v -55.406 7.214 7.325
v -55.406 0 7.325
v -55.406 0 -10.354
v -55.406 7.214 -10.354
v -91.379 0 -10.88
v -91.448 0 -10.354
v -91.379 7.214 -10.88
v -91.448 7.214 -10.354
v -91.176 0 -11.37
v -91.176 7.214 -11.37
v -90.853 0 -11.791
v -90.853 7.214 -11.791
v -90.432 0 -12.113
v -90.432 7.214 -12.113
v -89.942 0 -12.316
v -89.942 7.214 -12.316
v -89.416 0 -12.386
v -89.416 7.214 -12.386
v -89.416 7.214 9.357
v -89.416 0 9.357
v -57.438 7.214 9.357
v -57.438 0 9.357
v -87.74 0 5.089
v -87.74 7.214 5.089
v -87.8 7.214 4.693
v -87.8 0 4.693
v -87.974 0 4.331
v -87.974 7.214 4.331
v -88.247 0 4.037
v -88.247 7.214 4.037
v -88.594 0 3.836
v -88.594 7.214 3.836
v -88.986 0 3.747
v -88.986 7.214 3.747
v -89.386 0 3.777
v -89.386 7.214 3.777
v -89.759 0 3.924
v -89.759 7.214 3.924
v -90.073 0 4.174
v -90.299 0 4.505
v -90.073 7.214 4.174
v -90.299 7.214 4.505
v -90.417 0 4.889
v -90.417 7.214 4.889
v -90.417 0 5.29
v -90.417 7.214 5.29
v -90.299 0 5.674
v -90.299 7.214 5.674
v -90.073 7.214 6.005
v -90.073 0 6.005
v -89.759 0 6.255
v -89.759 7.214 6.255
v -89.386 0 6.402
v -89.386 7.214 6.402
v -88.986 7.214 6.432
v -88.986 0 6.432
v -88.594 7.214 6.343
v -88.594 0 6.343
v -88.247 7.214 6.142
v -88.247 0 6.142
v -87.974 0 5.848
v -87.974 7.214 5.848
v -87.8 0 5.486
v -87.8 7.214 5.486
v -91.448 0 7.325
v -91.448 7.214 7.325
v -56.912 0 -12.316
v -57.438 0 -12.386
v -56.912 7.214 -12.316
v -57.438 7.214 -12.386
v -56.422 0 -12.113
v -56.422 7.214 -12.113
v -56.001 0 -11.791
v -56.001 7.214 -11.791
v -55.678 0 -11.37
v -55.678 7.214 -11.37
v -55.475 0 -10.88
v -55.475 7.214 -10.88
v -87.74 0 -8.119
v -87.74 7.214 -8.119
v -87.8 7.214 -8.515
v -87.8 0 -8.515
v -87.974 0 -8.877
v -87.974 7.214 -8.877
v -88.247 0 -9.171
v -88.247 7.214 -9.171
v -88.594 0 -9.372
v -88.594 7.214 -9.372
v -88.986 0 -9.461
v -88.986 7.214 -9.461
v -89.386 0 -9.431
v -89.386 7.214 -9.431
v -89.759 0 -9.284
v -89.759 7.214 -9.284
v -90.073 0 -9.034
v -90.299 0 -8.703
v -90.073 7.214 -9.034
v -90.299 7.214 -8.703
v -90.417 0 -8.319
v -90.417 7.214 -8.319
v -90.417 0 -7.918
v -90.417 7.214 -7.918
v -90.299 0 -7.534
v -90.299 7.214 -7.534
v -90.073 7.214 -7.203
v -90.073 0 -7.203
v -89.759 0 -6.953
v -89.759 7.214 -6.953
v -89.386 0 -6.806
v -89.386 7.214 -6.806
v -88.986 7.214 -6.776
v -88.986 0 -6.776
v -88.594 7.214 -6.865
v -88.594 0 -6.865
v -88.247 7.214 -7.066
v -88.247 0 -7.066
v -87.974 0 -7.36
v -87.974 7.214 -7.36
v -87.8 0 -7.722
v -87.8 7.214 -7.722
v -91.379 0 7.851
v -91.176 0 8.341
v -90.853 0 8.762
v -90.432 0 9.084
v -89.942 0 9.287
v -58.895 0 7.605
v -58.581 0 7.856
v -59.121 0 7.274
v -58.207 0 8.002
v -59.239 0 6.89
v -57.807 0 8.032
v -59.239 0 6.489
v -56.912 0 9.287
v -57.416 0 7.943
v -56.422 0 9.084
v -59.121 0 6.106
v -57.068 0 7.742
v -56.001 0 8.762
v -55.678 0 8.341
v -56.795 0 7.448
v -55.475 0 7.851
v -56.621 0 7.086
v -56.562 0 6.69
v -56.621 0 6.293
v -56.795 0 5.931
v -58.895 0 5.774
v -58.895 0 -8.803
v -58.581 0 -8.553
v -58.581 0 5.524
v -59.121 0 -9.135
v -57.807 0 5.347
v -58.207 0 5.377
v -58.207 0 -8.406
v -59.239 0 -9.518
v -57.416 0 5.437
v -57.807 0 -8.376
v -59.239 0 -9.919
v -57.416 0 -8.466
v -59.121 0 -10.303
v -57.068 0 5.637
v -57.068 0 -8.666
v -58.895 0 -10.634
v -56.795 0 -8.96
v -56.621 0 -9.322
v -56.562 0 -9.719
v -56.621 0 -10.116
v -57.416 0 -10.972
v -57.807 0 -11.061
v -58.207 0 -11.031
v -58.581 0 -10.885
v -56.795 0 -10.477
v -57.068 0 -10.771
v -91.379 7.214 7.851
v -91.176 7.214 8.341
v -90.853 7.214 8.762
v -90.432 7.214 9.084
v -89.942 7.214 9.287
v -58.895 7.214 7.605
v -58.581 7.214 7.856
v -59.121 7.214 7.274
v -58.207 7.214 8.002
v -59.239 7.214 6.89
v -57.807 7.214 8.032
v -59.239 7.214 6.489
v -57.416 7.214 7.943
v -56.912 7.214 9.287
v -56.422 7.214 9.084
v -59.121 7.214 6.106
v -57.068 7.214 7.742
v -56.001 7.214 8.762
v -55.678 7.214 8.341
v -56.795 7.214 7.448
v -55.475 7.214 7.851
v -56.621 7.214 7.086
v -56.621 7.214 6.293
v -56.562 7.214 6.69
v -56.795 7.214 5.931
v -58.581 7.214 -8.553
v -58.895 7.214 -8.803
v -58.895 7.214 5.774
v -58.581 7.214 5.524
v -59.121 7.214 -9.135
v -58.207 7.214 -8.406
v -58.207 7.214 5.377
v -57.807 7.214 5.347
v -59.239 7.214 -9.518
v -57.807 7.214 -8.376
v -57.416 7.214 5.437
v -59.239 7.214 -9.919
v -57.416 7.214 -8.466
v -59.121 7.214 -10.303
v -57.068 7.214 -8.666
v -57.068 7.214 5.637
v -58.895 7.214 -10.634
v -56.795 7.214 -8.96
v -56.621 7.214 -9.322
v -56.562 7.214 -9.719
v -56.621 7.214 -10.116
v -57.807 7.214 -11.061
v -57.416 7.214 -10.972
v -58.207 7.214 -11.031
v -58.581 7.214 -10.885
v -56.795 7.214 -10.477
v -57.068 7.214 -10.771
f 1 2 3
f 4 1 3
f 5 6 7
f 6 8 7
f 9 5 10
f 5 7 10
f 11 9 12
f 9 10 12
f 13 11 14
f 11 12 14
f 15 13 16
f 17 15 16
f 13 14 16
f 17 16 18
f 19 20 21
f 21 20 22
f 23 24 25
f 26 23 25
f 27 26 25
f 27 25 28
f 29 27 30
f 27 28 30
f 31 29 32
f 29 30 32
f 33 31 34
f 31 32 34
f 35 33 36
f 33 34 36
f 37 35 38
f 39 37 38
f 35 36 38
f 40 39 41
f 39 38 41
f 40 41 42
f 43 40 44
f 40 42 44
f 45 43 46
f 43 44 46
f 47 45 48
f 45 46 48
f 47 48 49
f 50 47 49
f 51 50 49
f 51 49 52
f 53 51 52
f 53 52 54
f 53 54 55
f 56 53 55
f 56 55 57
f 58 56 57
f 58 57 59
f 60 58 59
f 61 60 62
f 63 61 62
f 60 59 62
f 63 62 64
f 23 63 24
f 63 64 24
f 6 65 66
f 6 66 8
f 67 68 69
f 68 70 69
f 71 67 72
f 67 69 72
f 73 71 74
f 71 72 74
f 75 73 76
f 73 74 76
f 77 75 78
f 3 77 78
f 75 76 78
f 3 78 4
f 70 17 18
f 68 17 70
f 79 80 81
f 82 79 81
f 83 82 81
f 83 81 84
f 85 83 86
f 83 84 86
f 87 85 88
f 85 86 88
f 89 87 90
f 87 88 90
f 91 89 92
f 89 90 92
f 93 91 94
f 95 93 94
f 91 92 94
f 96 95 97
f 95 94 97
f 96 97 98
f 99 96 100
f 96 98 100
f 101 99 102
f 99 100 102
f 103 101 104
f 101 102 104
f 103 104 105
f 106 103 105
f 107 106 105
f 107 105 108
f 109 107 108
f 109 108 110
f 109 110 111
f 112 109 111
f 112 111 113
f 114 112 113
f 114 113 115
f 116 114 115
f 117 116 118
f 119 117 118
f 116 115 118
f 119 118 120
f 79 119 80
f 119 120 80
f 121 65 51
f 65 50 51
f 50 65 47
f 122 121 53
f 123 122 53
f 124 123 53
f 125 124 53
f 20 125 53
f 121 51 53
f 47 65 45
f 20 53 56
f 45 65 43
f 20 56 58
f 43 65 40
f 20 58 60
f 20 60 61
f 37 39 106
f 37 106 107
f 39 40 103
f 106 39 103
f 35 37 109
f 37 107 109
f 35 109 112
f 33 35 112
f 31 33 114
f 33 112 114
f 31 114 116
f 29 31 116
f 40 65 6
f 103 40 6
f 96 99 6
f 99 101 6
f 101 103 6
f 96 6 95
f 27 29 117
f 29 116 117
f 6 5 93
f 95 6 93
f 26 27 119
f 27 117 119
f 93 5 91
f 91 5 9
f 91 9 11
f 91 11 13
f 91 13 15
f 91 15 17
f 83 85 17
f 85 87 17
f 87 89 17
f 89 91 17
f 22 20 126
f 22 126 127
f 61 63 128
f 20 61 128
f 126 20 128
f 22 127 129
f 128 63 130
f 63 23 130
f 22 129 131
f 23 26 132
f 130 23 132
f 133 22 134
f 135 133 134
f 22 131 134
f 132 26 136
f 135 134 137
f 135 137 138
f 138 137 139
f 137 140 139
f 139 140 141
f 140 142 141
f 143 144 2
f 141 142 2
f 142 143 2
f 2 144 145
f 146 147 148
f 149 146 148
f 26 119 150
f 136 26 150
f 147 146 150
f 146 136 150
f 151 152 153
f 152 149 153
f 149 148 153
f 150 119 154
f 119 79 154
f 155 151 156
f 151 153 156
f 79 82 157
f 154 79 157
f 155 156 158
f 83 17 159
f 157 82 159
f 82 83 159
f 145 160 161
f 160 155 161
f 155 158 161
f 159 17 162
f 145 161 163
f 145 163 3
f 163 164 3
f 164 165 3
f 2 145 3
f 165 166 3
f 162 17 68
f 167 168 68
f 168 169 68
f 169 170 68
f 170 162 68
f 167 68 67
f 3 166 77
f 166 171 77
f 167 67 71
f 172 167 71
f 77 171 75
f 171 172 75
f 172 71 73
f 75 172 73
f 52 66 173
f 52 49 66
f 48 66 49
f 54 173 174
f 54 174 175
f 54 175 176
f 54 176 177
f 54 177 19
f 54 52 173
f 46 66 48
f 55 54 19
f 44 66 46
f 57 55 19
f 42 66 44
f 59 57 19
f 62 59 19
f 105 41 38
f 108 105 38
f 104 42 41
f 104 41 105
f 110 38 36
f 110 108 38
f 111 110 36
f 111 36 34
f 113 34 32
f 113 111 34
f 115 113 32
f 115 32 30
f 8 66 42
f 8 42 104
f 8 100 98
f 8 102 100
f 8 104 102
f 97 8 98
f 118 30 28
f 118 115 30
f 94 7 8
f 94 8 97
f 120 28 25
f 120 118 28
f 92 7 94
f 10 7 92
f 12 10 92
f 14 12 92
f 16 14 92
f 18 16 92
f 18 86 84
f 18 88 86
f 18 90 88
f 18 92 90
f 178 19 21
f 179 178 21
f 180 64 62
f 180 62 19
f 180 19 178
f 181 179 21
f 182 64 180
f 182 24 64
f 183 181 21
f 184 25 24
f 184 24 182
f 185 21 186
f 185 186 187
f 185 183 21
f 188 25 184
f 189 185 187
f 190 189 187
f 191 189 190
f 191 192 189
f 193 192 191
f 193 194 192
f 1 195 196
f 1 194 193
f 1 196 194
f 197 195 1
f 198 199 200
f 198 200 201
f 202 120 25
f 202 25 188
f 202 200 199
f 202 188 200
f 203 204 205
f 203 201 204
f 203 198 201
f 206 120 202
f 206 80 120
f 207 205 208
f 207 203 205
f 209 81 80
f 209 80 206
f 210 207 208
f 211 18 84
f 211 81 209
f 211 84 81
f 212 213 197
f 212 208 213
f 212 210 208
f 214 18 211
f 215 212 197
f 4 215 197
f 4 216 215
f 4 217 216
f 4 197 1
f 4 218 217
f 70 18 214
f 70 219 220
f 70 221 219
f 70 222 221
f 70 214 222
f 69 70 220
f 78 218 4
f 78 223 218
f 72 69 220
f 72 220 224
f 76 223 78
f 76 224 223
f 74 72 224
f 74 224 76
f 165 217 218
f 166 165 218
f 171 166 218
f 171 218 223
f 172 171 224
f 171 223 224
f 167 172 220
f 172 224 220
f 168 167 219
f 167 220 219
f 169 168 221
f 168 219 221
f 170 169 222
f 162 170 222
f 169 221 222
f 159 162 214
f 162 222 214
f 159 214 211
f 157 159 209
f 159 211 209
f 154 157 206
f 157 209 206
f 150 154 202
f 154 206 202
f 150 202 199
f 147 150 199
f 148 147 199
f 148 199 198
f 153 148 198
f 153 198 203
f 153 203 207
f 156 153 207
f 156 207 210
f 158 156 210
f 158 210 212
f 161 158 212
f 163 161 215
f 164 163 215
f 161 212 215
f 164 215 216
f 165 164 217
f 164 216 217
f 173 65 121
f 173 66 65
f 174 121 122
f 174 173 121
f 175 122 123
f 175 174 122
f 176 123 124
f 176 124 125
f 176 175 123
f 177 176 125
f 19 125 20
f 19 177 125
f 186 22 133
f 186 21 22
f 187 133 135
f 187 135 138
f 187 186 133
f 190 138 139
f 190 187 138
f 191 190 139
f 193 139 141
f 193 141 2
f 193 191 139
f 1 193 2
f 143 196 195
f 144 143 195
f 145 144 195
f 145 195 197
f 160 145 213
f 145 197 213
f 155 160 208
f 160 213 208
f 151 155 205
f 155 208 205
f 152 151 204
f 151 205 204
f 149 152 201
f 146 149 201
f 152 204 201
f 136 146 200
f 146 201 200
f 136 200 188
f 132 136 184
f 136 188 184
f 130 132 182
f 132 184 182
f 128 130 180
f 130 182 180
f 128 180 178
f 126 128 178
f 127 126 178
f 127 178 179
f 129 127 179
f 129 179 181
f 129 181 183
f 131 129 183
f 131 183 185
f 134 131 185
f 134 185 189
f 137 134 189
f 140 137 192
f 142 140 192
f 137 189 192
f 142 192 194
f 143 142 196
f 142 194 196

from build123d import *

# Parameters (mm, degrees)
SKETCH1_W           = 36.0426
SKETCH1_H           = 21.7424
BOSS_EXTRUDE1_DEPTH = 7.2136
SKETCH2_R           = 1.3462
CUT_EXTRUDE1_DEPTH  = 7.2136
FILLET1_R           = 2.032


with BuildPart() as part:
    # Sketch1 → Boss-Extrude1 (new body)
    with BuildSketch(Plane(origin=(0, 0, 0), x_dir=(1, 0, 0), z_dir=(0, 1, 0))):
        with Locations((-73.427135669, 1.514506775)):
            Rectangle(SKETCH1_W, SKETCH1_H)
    extrude(amount=BOSS_EXTRUDE1_DEPTH)

    # Sketch2 → Cut-Extrude1 (cut)
    with BuildSketch(Plane(origin=(0, 7.2136, 0), x_dir=(1, 0, 0), z_dir=(0, 1, 0))):
        with Locations((-57.907735669, 9.718706775)):
            Circle(SKETCH2_R)
        with Locations((-89.086235669, 8.118506775)):
            Circle(SKETCH2_R)
        with Locations((-57.907735669, -6.689693225)):
            Circle(SKETCH2_R)
        with Locations((-89.086235669, -5.089493225)):
            Circle(SKETCH2_R)
    extrude(amount=-CUT_EXTRUDE1_DEPTH, mode=Mode.SUBTRACT)

    # Fillet1
    fillet1_edges = [part.edges().sort_by_distance(p)[0] for p in [
        (-91.448435669, 3.6068, -12.385706775),
        (-55.405835669, 3.6068, -12.385706775),
        (-55.405835669, 3.6068, 9.356693225),
        (-91.448435669, 3.6068, 9.356693225),
    ]]
    fillet(fillet1_edges, radius=FILLET1_R)


solid = part.part
